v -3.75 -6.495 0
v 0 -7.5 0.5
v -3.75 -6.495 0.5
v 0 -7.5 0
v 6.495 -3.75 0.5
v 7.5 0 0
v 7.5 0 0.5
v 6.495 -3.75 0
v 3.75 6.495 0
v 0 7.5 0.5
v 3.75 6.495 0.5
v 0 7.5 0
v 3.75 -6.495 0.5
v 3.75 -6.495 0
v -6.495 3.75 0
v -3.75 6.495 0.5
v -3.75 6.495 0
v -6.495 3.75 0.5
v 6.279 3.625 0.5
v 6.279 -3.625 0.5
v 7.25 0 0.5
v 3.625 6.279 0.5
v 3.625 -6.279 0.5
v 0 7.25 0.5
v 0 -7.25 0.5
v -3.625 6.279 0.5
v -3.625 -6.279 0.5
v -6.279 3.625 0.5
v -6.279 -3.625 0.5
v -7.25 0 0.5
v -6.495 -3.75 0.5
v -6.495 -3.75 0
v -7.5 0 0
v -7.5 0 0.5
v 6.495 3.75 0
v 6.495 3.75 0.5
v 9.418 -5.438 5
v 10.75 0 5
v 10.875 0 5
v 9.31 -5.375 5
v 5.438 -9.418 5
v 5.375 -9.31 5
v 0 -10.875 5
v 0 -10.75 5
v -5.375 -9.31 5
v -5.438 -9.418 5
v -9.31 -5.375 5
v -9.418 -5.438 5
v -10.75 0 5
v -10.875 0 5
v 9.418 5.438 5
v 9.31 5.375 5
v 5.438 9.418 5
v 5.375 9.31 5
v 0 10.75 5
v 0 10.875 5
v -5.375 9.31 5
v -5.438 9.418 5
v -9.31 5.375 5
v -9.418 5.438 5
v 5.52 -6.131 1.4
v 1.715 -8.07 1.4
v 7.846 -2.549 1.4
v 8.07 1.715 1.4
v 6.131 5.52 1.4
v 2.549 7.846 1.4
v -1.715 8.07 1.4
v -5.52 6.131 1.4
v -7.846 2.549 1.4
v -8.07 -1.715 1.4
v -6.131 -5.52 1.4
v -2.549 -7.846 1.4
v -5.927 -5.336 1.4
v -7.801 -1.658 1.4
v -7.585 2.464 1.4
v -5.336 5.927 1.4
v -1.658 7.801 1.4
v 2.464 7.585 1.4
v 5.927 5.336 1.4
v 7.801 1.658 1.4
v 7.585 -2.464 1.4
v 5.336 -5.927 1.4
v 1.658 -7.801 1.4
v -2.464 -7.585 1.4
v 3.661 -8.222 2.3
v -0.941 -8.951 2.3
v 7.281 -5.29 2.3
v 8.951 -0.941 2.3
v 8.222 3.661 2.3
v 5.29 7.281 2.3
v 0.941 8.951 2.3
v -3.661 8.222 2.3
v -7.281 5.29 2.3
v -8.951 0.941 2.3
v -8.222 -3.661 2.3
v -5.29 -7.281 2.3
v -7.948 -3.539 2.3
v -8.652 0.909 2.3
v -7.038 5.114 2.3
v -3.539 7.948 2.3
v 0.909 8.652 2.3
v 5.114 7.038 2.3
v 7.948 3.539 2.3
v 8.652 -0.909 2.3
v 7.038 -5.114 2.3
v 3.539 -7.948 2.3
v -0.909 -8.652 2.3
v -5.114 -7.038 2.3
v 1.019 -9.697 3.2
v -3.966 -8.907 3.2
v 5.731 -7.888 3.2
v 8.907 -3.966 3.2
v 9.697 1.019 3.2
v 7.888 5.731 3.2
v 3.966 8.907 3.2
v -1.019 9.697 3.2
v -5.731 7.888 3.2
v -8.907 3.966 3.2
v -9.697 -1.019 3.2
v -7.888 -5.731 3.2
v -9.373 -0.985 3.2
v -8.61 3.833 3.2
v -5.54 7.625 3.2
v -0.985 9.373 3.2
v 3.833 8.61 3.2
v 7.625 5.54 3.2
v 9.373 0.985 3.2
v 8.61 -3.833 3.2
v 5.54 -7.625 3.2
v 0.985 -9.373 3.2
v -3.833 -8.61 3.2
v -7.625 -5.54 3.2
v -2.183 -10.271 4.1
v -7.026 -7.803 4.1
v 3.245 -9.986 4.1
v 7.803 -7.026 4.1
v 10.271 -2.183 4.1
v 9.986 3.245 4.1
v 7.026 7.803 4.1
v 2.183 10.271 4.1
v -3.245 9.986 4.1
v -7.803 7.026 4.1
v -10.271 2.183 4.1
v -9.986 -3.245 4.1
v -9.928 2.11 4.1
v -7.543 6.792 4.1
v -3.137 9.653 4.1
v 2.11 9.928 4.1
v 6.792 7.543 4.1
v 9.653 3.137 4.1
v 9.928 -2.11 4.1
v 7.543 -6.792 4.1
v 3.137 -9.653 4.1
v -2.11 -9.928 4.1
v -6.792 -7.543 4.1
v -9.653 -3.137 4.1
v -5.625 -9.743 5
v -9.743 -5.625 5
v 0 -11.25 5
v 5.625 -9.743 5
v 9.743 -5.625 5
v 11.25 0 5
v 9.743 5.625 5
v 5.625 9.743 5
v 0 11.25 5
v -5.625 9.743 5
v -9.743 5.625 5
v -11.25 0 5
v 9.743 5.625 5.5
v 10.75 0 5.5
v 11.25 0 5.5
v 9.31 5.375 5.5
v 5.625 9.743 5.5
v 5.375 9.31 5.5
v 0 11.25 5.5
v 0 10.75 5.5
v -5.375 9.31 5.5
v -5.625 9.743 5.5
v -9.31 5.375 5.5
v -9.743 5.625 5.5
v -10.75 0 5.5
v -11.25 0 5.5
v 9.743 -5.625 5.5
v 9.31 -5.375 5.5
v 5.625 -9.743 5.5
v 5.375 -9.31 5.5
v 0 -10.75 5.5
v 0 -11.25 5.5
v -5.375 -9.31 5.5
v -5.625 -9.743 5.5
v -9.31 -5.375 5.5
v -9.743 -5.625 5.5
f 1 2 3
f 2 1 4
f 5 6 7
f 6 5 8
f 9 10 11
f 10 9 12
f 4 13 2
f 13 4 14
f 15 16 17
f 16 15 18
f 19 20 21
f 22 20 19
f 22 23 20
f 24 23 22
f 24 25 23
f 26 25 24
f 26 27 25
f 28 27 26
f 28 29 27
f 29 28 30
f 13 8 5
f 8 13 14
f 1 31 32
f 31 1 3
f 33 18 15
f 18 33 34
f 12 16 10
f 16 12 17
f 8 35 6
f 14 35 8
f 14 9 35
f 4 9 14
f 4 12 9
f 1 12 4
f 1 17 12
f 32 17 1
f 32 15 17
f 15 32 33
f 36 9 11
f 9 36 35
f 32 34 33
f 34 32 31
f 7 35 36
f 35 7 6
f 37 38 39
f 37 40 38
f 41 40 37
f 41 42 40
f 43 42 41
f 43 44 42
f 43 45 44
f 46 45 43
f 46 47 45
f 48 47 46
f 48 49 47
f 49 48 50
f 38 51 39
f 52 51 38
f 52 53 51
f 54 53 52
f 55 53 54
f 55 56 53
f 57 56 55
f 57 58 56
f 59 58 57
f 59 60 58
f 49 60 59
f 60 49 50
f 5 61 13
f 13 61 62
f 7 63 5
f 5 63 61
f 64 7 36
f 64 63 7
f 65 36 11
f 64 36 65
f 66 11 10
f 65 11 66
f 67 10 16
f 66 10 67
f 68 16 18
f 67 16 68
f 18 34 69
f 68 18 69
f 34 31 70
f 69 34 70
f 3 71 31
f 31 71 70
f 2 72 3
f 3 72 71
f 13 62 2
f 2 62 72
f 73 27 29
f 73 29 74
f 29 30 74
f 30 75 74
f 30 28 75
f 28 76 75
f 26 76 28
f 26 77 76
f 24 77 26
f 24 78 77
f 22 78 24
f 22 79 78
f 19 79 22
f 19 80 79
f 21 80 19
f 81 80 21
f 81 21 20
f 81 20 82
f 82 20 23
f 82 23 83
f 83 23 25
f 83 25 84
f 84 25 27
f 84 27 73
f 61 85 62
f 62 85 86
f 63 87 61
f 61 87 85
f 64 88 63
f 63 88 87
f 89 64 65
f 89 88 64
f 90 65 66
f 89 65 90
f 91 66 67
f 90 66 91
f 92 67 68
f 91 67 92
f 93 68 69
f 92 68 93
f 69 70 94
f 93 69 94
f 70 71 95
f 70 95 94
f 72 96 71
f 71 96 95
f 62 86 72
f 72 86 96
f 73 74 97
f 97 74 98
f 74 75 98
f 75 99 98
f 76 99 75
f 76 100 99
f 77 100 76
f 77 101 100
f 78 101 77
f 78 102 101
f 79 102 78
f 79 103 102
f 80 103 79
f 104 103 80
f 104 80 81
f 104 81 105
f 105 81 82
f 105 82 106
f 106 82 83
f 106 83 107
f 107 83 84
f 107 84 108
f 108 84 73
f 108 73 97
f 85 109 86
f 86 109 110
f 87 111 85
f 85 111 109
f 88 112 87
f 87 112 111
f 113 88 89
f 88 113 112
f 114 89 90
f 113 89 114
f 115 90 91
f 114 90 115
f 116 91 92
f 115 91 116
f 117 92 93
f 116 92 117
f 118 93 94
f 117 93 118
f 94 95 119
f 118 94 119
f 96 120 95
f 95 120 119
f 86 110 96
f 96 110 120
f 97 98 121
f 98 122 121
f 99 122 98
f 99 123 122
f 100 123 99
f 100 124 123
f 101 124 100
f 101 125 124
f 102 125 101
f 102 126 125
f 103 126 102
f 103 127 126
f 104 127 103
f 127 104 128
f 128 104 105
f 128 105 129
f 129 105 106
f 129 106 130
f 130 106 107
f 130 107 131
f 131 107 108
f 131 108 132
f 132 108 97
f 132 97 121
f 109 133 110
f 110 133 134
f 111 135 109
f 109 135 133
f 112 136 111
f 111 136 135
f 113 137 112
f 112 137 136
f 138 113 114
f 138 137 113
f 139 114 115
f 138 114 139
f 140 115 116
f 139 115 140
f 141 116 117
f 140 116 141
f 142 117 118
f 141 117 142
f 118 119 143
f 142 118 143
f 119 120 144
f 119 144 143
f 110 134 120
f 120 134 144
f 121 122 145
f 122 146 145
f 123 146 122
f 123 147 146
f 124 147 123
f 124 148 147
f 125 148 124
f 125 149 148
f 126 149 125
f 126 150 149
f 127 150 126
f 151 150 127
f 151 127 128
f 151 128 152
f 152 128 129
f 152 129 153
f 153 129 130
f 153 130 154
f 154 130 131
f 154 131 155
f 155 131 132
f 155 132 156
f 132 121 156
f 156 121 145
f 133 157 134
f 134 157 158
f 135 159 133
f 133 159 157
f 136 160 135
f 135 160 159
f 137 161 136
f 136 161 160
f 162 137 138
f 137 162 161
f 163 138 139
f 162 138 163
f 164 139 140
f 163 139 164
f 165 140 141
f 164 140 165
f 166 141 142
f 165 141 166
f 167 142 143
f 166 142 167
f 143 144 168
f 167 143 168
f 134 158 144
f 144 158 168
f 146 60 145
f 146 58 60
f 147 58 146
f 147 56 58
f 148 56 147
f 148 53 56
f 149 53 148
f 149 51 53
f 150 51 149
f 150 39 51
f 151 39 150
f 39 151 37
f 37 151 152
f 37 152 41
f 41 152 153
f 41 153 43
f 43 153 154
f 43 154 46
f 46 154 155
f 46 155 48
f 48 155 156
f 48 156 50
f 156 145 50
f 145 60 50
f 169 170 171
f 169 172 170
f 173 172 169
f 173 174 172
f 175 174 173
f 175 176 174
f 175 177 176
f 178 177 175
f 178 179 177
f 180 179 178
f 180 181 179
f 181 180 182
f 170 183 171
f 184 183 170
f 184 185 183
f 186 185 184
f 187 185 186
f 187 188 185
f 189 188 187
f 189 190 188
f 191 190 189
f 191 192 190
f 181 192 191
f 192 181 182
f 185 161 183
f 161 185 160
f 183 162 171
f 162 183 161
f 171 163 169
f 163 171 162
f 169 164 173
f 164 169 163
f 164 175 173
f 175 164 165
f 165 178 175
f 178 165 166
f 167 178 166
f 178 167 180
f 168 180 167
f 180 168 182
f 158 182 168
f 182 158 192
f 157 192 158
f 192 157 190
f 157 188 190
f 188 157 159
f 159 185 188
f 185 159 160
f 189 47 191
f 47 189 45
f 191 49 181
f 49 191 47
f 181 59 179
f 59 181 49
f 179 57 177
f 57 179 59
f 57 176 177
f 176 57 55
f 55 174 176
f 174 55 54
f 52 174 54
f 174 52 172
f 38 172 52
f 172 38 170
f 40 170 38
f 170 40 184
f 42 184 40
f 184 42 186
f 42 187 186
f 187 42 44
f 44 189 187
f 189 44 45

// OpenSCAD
module geometric_planter(height, width, wall_thickness=0.5, sides=4, base_thickness, scale=1) {
	echo(base_thickness);
	base_thickness = base_thickness == undef ? wall_thickness : base_thickness;

	//Draws base layer
	linear_extrude(height=base_thickness) {
		difference() {
			circle(d=width, $fn=sides);
		}
	}
	
	//Draws twist
	translate([0,0,base_thickness]) {
		linear_extrude(height=height-wall_thickness, twist=90, slices=5, scale=scale) {
			difference() {
				circle(d=width, $fn=sides);
				circle(d=width-wall_thickness, $fn=sides);

			}
		}
	}
	
	translate([0,0,height]) {
		linear_extrude(height=base_thickness) {
			difference() {
				circle(d=width*scale, $fn=sides);
				circle(d=width*scale-wall_thickness*2, $fn=sides);
			}
		}
	}
}

geometric_planter(5, 15, sides=12, wall_thickness=0.5, base_thickness=0.5,
		scale=1.5);
